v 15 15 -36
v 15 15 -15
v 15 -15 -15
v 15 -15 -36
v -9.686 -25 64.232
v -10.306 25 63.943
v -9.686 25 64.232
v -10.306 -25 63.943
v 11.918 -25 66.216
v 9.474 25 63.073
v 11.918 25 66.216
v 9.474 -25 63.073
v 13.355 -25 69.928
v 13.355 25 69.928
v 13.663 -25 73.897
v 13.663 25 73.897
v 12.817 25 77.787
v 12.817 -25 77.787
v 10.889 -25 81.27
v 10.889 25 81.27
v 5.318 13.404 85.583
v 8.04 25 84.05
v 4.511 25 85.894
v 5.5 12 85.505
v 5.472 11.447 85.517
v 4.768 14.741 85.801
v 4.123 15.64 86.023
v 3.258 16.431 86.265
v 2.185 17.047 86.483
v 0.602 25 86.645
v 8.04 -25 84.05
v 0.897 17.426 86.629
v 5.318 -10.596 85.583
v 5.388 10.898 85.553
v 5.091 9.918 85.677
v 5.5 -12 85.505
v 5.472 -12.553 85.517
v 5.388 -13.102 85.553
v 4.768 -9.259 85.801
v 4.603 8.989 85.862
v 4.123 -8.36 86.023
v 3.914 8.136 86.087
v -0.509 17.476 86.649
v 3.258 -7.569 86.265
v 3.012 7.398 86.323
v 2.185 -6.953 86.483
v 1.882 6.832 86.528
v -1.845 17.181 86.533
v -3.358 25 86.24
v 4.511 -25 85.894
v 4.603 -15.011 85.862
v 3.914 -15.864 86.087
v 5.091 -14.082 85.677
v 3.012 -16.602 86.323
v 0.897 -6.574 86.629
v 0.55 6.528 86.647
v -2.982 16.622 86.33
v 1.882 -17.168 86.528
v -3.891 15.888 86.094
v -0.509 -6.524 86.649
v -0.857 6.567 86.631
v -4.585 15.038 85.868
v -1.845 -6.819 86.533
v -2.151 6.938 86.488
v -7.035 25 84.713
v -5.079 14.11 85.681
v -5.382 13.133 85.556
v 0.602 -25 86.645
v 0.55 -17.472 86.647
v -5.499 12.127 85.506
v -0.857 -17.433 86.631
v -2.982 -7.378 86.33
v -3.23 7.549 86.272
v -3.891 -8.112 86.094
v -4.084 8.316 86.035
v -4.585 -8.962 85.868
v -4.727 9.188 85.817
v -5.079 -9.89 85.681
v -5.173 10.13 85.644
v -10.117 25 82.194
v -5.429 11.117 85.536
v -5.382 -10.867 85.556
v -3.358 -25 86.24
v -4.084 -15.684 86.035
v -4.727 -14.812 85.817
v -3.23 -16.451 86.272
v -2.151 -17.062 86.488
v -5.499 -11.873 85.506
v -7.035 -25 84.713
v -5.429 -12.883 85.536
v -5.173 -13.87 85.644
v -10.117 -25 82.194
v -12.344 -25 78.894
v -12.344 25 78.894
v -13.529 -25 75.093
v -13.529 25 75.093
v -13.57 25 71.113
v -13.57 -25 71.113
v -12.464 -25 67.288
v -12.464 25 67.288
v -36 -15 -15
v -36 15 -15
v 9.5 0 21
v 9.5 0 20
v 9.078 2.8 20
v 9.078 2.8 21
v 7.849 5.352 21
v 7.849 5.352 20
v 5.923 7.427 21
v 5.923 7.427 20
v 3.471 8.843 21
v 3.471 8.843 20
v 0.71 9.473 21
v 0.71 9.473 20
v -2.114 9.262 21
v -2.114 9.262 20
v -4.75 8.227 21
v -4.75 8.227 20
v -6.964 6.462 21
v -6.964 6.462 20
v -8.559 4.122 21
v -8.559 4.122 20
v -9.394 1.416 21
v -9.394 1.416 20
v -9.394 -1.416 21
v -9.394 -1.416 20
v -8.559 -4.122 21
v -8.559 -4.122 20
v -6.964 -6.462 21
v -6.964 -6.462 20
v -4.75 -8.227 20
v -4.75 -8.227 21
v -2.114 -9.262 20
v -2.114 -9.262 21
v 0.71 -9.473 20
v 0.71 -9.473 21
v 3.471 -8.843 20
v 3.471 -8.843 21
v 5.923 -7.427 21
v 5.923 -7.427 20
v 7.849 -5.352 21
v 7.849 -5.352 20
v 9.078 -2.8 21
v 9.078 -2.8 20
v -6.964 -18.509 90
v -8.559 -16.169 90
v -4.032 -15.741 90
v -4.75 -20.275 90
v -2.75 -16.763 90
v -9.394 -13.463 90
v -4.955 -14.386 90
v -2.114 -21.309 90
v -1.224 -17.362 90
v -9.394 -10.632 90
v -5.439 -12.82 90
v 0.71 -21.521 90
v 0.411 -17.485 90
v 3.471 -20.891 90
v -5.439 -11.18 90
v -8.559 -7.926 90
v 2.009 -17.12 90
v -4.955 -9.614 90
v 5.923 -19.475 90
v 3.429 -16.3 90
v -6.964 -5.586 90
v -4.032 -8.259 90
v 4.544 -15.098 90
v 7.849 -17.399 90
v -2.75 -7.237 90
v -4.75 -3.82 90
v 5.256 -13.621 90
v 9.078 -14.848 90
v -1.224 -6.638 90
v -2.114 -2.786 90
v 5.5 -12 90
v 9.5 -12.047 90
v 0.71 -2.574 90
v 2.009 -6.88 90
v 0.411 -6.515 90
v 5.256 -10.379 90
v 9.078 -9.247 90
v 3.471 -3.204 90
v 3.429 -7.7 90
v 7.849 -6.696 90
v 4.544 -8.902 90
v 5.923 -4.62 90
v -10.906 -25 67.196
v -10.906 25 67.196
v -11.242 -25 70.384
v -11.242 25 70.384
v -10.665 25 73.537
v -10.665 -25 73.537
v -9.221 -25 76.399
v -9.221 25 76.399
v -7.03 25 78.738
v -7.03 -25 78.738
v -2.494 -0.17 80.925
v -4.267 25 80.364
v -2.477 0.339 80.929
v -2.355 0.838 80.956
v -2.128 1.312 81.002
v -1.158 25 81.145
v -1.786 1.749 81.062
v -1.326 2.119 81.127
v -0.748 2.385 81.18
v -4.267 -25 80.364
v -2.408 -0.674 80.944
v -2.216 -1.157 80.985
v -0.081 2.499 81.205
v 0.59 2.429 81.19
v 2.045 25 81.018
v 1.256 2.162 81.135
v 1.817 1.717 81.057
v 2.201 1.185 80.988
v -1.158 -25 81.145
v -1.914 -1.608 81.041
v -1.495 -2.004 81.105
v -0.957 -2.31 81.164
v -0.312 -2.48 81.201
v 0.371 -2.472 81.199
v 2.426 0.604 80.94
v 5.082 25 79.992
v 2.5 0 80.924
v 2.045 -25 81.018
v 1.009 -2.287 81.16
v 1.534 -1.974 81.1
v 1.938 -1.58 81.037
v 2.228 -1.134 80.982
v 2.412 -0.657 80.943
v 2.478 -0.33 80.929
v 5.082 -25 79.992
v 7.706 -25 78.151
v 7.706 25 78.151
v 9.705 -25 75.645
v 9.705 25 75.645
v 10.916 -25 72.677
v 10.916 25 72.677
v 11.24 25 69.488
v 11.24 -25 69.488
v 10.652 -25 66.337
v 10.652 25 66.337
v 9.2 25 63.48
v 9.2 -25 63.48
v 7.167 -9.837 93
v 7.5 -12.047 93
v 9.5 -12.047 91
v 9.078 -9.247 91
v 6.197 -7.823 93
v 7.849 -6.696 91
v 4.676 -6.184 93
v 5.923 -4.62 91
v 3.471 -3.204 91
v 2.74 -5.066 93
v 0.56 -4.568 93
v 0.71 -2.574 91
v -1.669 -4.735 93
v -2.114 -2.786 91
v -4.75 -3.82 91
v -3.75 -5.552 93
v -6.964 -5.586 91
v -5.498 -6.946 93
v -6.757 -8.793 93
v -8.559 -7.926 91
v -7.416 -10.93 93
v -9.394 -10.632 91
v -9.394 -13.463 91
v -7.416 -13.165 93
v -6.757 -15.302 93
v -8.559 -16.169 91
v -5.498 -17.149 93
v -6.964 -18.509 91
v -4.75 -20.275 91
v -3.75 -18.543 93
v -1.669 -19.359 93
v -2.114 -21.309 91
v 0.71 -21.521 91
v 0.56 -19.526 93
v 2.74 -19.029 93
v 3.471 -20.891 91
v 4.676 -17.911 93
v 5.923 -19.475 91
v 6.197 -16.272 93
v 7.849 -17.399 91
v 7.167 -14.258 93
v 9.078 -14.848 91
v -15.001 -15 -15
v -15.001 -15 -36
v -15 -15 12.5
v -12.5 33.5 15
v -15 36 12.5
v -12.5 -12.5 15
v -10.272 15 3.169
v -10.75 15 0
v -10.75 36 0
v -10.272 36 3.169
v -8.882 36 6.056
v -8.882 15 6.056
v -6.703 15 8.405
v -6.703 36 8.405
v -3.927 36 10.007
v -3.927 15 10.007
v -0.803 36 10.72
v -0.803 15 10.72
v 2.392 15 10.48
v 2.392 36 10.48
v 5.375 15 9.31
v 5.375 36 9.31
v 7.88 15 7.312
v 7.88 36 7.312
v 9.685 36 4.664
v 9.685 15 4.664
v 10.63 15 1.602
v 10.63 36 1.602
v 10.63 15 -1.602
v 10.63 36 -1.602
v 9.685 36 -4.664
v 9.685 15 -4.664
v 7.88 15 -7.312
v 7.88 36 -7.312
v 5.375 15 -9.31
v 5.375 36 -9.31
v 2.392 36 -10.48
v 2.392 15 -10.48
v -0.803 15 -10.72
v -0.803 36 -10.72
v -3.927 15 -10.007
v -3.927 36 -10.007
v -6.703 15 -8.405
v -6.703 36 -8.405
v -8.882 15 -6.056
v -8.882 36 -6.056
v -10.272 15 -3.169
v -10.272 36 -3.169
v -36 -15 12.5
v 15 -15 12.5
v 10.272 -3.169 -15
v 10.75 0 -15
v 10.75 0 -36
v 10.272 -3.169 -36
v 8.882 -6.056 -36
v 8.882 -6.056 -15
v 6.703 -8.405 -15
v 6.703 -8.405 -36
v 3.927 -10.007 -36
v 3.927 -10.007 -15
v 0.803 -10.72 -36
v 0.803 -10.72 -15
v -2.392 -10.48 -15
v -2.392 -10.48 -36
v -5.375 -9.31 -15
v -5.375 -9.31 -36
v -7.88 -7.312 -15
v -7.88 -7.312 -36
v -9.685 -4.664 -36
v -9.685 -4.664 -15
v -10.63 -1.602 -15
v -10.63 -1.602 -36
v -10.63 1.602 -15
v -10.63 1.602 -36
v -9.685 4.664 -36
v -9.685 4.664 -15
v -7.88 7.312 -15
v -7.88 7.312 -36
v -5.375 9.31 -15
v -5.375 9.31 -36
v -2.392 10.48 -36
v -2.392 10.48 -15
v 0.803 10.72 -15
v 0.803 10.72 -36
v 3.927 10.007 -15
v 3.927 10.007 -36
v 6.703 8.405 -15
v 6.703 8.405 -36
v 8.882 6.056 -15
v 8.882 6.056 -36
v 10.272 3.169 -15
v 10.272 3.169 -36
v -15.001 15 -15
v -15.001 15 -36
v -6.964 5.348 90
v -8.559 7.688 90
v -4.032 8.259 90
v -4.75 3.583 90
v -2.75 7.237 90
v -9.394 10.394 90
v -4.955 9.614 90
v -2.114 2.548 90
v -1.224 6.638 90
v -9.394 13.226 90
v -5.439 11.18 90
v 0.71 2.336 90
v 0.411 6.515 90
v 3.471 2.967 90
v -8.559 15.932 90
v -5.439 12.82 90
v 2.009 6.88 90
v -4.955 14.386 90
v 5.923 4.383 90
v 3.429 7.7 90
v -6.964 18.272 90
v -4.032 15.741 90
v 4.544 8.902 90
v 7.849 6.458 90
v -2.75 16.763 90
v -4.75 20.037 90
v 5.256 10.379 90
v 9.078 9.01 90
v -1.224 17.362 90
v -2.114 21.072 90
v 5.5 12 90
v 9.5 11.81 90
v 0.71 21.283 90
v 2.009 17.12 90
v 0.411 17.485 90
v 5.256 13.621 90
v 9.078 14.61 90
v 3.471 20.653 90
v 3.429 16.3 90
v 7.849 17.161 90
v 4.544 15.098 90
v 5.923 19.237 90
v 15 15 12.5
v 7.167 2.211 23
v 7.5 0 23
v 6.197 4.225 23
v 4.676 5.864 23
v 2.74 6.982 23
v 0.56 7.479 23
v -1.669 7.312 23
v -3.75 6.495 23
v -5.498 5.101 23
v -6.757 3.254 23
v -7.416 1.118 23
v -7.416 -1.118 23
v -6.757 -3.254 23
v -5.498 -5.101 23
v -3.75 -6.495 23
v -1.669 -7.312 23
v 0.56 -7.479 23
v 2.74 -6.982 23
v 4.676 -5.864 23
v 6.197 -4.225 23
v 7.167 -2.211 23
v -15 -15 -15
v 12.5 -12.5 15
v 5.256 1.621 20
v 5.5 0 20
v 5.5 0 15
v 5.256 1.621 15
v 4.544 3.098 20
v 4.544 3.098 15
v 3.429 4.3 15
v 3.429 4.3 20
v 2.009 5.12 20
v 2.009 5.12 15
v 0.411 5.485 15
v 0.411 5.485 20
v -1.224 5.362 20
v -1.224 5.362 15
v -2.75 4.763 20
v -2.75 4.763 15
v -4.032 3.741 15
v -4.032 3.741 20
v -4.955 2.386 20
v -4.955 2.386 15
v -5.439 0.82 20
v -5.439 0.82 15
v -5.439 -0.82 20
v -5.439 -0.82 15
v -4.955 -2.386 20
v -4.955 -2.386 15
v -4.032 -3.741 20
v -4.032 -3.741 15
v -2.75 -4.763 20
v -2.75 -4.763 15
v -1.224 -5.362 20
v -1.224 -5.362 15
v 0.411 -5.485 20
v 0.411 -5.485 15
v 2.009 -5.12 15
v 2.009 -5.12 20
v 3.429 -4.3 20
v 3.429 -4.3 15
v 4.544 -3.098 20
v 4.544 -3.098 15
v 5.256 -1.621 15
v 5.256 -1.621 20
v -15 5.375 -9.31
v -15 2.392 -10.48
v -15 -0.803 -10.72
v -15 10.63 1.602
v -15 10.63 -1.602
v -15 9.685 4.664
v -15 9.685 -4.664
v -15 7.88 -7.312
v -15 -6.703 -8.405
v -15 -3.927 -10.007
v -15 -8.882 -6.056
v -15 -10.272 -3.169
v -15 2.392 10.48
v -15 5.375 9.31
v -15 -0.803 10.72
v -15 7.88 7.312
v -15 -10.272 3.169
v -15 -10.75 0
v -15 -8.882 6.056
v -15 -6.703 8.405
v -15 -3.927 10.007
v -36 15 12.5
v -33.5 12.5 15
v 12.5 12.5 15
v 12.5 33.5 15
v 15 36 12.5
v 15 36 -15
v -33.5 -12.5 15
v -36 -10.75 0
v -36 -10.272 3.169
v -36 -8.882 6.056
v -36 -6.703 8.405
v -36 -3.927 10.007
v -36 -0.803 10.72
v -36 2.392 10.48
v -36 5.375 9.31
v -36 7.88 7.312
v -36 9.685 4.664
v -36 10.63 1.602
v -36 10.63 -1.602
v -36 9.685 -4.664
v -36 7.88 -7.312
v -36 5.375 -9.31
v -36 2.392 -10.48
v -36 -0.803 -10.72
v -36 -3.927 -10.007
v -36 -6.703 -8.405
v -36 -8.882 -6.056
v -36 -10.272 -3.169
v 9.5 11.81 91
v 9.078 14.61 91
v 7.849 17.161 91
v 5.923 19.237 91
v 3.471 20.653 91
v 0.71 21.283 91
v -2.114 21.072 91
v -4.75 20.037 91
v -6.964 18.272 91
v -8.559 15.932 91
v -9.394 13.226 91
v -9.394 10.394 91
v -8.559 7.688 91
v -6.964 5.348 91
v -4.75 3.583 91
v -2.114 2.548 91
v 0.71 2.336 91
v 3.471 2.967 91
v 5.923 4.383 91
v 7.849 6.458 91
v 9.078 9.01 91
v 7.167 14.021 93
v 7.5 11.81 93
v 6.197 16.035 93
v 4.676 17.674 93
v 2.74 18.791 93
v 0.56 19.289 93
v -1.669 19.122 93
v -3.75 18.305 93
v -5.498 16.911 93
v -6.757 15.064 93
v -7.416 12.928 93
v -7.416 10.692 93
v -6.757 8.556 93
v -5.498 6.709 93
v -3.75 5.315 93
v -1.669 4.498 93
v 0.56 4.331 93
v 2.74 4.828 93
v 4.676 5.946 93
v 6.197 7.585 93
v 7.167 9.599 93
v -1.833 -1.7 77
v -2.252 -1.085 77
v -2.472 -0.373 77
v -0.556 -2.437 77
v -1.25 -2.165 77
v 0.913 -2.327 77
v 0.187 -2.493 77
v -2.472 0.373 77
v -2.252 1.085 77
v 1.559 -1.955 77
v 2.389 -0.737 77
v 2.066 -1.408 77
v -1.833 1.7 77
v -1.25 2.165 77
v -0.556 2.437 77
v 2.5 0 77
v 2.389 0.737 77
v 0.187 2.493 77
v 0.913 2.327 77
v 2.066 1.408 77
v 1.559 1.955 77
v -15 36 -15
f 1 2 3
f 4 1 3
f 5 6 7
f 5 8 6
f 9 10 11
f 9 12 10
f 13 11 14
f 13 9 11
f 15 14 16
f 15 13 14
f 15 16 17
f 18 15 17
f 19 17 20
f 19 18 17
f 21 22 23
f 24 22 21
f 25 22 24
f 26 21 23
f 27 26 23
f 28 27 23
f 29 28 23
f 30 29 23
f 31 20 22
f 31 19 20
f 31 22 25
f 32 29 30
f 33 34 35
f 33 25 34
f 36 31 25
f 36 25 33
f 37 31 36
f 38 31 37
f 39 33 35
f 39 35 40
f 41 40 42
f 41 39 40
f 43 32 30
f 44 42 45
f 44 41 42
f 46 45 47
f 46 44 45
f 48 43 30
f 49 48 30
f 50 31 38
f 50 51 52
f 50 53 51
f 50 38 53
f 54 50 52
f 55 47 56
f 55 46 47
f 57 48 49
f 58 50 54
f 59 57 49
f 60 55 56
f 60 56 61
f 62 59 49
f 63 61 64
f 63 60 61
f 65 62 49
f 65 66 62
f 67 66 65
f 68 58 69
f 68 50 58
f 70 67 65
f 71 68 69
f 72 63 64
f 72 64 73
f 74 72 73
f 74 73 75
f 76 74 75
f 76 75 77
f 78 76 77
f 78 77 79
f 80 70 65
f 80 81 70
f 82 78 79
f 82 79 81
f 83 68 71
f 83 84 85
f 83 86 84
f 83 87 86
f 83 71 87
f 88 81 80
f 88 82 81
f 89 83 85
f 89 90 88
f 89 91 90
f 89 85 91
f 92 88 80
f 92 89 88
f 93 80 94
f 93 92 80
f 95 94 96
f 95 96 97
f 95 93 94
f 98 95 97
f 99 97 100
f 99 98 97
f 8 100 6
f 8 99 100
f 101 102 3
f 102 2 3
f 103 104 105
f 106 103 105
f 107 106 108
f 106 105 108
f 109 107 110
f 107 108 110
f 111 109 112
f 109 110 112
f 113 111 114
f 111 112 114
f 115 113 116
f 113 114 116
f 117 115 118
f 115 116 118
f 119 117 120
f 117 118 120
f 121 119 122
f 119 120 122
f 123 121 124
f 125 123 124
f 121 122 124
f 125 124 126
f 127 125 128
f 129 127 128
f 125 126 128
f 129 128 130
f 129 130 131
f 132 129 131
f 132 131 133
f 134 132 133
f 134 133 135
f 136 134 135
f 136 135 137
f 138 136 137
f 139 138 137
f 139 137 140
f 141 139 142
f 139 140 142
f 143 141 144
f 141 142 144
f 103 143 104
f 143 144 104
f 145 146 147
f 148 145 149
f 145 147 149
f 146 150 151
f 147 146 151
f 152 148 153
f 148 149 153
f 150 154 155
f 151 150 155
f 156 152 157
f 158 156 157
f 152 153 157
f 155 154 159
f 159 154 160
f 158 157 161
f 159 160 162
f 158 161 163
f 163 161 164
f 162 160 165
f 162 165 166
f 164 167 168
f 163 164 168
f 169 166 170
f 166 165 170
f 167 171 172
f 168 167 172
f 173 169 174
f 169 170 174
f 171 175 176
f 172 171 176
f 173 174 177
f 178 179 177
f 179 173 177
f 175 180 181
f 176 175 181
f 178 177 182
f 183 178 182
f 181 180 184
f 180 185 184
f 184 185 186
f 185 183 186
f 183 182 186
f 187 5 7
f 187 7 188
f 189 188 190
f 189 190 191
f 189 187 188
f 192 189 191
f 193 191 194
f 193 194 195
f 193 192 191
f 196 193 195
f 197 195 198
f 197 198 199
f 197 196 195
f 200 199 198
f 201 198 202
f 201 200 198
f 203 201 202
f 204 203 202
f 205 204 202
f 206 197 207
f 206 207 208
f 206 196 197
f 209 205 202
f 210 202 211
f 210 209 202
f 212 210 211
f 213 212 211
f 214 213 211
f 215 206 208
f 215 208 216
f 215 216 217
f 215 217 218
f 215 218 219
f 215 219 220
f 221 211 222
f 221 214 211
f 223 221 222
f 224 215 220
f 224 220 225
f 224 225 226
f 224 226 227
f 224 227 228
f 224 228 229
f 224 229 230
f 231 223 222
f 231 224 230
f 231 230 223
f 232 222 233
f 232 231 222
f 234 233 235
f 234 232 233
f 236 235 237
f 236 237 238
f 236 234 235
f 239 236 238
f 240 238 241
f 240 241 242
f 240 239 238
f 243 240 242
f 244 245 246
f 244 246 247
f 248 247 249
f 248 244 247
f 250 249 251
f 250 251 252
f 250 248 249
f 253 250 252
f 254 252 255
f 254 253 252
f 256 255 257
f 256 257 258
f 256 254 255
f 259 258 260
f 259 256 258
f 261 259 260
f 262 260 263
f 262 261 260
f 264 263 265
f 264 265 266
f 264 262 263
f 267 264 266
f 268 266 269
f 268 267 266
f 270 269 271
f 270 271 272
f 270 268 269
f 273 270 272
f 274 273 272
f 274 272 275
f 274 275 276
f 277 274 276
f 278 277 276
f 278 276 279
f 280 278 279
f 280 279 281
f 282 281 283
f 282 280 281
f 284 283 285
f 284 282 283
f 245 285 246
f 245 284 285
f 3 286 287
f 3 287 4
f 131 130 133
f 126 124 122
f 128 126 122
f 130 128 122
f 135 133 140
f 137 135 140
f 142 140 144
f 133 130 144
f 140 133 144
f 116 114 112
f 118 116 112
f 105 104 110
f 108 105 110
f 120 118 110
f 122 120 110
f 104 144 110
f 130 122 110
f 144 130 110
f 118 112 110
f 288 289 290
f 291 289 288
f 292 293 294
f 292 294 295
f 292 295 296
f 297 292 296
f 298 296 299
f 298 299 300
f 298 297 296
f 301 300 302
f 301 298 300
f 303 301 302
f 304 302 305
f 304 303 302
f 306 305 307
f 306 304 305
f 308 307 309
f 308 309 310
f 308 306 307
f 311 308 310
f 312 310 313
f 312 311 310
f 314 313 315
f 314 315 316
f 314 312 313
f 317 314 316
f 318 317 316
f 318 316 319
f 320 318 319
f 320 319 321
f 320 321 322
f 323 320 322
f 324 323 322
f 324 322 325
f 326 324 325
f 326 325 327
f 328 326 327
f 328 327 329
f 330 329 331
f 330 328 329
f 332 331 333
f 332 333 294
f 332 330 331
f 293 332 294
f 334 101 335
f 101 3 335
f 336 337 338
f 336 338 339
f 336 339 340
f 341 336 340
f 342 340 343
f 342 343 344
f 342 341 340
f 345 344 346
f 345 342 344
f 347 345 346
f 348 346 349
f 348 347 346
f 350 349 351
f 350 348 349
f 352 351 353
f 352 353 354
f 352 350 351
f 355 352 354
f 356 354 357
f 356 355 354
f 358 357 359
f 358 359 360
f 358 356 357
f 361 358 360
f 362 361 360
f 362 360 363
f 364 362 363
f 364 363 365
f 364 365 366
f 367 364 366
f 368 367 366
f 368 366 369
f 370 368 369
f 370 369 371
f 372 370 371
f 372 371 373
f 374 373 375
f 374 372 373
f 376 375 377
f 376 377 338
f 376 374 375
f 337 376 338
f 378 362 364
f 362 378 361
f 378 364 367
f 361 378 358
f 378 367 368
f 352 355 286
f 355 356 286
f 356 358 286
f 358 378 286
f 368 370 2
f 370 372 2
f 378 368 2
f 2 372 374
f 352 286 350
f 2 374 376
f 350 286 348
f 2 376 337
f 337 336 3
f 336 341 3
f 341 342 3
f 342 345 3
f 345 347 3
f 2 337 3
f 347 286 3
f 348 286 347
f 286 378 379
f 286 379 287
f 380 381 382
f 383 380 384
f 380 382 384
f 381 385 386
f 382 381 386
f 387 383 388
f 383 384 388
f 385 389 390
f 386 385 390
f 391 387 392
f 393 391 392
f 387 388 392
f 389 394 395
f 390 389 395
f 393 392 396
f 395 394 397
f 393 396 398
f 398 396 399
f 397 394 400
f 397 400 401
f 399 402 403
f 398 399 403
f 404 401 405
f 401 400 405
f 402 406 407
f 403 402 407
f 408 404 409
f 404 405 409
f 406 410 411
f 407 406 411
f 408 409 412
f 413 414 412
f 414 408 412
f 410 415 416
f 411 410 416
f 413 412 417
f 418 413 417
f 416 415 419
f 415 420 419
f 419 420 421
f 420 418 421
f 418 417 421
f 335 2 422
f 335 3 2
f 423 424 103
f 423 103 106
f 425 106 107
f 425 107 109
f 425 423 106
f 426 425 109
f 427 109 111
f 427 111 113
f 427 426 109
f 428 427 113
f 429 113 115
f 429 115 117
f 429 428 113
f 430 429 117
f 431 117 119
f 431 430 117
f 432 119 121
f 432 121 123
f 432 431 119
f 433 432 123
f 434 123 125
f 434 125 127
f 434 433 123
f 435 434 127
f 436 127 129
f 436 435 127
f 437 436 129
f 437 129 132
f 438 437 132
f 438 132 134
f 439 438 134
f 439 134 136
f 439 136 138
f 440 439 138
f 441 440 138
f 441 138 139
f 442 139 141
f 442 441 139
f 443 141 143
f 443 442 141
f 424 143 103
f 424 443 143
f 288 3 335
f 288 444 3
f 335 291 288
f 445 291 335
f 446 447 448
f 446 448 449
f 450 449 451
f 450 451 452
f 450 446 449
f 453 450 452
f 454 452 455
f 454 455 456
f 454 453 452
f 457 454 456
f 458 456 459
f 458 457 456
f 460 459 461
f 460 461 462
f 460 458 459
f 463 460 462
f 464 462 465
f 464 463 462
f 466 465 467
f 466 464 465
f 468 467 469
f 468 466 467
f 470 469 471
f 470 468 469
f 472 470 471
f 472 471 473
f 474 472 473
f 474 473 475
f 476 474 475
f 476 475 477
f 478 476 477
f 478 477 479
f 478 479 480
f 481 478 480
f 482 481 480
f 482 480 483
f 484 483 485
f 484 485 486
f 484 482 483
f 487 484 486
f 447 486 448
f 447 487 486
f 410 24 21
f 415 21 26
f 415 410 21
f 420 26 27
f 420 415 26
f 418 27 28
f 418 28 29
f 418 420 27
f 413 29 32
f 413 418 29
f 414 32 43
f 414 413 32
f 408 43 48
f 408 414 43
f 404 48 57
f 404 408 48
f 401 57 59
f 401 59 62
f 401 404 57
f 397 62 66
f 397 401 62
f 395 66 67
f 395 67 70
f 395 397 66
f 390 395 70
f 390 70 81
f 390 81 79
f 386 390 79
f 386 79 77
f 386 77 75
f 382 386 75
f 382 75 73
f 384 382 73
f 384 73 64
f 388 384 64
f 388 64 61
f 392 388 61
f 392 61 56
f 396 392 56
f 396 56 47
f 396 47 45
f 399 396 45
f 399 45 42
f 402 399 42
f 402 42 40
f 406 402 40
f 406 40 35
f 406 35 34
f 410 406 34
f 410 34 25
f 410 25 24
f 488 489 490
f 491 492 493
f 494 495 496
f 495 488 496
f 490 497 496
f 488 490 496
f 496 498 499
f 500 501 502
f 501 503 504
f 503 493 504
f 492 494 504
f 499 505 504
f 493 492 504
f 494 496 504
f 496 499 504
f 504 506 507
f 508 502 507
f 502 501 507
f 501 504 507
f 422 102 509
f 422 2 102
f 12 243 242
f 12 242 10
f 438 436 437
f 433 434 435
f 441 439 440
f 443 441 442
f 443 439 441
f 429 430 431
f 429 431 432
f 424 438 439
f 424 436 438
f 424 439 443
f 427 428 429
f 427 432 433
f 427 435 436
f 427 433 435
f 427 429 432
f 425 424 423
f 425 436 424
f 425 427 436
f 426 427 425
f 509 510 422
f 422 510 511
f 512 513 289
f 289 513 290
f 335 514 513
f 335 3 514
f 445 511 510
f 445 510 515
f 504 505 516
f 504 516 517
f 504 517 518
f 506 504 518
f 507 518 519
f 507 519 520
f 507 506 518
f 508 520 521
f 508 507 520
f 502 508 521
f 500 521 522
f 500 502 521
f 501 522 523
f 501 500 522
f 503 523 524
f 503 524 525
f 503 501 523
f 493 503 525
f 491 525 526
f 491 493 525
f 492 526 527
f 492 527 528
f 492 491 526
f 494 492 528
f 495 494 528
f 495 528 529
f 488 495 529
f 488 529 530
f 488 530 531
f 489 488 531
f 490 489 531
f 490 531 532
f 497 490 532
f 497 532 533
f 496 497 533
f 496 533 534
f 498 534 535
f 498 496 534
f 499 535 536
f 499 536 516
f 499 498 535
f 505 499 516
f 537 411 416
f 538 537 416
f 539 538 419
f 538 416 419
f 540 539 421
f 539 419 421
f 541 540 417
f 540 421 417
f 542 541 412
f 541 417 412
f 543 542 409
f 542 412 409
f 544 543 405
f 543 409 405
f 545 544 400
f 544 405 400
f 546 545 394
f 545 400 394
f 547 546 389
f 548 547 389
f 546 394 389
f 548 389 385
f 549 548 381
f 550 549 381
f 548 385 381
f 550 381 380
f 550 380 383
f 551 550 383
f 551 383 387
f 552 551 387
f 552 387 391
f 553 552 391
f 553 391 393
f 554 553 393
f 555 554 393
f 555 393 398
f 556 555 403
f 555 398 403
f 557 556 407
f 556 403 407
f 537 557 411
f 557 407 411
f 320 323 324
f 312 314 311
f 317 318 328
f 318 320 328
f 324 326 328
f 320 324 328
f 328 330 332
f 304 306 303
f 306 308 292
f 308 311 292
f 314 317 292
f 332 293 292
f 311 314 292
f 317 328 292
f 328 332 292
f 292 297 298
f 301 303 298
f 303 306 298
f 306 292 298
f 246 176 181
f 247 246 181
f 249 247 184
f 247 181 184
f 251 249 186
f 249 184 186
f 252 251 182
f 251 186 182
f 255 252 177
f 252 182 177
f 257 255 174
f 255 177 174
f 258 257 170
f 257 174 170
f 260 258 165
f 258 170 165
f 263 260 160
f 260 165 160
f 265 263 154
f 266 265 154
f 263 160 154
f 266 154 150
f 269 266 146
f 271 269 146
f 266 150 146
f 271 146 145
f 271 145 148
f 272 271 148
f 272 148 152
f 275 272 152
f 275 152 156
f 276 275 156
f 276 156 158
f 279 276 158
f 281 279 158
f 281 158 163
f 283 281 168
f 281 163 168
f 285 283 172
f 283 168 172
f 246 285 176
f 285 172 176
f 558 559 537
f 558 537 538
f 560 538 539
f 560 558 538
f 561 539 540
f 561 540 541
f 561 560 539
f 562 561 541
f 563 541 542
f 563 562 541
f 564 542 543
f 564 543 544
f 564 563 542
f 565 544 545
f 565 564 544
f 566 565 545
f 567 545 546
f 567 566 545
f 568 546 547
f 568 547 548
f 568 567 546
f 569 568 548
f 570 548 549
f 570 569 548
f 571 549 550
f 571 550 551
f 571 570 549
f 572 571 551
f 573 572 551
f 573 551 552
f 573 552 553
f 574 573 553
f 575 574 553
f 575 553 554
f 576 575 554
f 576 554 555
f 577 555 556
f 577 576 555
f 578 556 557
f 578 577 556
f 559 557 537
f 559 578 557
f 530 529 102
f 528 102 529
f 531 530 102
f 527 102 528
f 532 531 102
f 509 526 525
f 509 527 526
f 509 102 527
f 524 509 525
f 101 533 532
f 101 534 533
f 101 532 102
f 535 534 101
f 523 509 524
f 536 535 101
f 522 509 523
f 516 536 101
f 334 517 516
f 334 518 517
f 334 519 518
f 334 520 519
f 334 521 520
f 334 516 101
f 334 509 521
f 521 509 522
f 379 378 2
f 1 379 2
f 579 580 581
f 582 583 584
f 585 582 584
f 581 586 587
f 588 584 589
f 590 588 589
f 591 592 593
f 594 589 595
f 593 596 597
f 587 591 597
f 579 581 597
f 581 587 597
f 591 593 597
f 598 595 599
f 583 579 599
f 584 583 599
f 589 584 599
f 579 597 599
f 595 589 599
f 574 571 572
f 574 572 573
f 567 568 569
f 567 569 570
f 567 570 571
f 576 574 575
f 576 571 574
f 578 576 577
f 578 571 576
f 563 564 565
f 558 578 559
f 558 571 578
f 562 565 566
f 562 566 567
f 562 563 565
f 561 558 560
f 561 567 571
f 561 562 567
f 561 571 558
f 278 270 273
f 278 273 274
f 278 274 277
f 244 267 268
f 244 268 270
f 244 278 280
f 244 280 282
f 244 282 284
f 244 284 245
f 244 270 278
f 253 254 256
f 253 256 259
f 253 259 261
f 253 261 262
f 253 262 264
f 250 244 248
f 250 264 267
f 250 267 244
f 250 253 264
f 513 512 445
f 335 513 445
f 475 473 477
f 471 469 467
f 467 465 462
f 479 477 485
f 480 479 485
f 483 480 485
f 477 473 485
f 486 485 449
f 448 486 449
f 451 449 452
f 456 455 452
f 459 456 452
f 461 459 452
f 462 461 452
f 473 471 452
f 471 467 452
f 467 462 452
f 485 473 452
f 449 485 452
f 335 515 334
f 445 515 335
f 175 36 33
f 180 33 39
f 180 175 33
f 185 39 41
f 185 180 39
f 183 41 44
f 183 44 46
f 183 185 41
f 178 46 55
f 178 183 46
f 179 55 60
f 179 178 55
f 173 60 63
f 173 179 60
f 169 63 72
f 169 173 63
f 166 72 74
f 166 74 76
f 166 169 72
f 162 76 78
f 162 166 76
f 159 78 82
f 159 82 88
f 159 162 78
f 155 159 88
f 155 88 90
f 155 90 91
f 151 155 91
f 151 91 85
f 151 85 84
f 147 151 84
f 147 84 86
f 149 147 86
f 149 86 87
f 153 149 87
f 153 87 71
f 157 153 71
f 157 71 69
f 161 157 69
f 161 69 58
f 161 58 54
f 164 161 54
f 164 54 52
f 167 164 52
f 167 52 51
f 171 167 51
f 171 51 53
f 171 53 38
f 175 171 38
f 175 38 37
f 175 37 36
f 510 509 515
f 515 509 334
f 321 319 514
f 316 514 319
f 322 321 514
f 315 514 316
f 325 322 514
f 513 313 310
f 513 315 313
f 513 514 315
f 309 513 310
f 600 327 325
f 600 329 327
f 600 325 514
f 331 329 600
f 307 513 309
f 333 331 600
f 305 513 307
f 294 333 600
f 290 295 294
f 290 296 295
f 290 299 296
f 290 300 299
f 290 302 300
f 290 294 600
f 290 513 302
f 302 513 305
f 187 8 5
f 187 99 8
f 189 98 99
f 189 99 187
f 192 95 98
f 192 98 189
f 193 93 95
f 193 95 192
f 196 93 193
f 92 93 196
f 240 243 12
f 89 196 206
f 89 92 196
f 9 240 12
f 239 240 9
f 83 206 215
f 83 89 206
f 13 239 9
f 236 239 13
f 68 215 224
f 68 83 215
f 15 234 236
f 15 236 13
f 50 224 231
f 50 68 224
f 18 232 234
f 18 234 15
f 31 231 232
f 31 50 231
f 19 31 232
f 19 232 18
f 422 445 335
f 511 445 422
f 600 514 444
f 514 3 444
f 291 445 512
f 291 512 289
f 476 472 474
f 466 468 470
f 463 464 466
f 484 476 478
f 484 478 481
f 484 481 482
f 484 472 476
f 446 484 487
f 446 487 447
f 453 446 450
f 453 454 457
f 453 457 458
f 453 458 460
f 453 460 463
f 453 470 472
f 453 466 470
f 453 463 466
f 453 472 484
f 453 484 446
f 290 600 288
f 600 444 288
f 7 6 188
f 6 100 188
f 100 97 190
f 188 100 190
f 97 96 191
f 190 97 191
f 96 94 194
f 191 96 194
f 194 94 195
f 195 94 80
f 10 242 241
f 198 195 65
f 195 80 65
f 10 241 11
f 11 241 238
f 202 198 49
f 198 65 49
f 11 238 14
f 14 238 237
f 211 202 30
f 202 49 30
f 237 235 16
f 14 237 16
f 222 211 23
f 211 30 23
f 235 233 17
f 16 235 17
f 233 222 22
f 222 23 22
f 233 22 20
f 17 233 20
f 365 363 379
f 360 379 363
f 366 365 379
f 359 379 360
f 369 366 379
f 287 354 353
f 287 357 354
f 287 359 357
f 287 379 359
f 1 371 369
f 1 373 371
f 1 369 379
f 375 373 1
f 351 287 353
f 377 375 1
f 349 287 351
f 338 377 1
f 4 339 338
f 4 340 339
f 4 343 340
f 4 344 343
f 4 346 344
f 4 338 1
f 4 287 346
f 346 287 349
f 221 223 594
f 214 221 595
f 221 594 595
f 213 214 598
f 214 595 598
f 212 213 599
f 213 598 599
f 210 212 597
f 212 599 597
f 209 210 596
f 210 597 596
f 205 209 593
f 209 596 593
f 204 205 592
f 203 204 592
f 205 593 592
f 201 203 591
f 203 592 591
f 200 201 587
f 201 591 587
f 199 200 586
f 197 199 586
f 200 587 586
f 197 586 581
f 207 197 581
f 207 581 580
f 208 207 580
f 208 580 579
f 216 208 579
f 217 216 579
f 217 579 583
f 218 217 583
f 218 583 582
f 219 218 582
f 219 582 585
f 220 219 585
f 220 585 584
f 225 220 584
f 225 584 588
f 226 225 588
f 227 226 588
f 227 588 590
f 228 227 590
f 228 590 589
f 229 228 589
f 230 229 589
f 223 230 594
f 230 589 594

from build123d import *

# Parameters (mm, degrees)
F0_W       = 30
F0_H       = 30
F1_DEPTH   = 15
F3_W       = 30
F3_H       = 30
F3_R       = 10.75
F4_DEPTH   = 21
F5_COUNT   = 2
F5_ANGLE   = 90
F6_W       = 30.0012215599
F6_H       = 30
F6_R       = 10.75
F7_DEPTH   = 21
F9_R       = 5.5
F10_DEPTH  = 5
F11_R      = 9.5
F11_R_2    = 5.5
F12_DEPTH  = 3
F13_SIZE   = 2
F14_SIZE   = 2.5
F14_2_SIZE = 2.5
F16_DEPTH  = 25
F18_R      = 2.5
F19_DEPTH  = 7
F21_R      = 5.5
F22_DEPTH  = 5
F23_R      = 9.5
F24_DEPTH  = 3
F25_SIZE   = 2


with BuildPart() as f1:
    # F0 (on Front) → F1 (new body, symmetric)
    with BuildSketch(Plane.XZ):
        Rectangle(F0_W, F0_H)
    extrude(amount=F1_DEPTH, both=True)

    # F3 (on face) → F4 (join)
    with BuildSketch(Plane(origin=(-15, 0, 0), x_dir=(0, -1, 0), z_dir=(-1, 0, 0))):
        Rectangle(F3_W, F3_H)
        Circle(F3_R, mode=Mode.SUBTRACT)
    extrude(amount=F4_DEPTH)


with BuildPart() as f5_1:
    # F5: instance of F1
    add(f1.part.rotate(Axis((0, 0, -5.7476405054), (0, 0, -1)), 1 * F5_ANGLE / (F5_COUNT - 1)))

    # F14
    f14_edges = [f5_1.edges().sort_by_distance(p)[0] for p in [
        (15, 10.5, 15),
        (0, 36, 15),
        (-15, 10.5, 15),
        (0, -15, 15),
    ]]
    chamfer(f14_edges, length=F14_SIZE)


with BuildPart() as f7:
    # F6 (on face) → F7 (new body)
    with BuildSketch(Plane(origin=(0, 0, -15), x_dir=(1, 0, 0), z_dir=(0, 0, -1))):
        with Locations((-0.00061078, 0)):
            Rectangle(F6_W, F6_H)
        Circle(F6_R, mode=Mode.SUBTRACT)
    extrude(amount=F7_DEPTH)


with BuildPart() as f10:
    # F9 (on offset) → F10 (new body)
    with BuildSketch(Plane.XY.offset(20)):
        Circle(F9_R)
    extrude(amount=-F10_DEPTH)


with BuildPart() as f12:
    # F11 (on face) → F12 (new body)
    with BuildSketch(Plane.XY.offset(20)):
        Circle(F11_R)
        Circle(F11_R_2, mode=Mode.SUBTRACT)
        Circle(F11_R_2)
    extrude(amount=F12_DEPTH)

    # F13
    f13_edges = [f12.edges().sort_by_distance(p)[0] for p in [
        (-9.5, 0, 23),
    ]]
    chamfer(f13_edges, length=F13_SIZE)


with BuildPart() as f1_1:
    add(f1.part)

    # F14#2
    f14_2_edges = [f1_1.edges().sort_by_distance(p)[0] for p in [
        (-10.5, -15, 15),
        (-10.5, 15, 15),
        (-36, 0, 15),
        (15, 0, 15),
    ]]
    chamfer(f14_2_edges, length=F14_2_SIZE)


with BuildPart() as f16:
    # F15 (on Front) → F16 (new body, symmetric)
    with BuildSketch(Plane.XZ):
        with BuildLine():
            Line((-10.3058908372, 63.9432949316), (-9.6855354671, 64.232037034))
            ThreePointArc((-9.6855354671, 64.232037034), (0.447806105, 81.1961362197), (9.1995952199, 63.4797184134))
            Line((9.1995952199, 63.4797184134), (9.4740811403, 63.0731721958))
            ThreePointArc((9.4740811403, 63.0731721958), (0.6018764298, 86.6448375573), (-10.3058908372, 63.9432949316))
        make_face()
    extrude(amount=F16_DEPTH, both=True)

    # F18 (on offset) → F19 (join)
    with BuildSketch(Plane.XY.offset(77)):
        Circle(F18_R)
    extrude(amount=F19_DEPTH)

    # F21 (on offset) → F22 (join)
    with BuildSketch(Plane.XY.offset(90)):
        with Locations((0, 12)):
            Circle(F21_R)
        with Locations((0, -12)):
            Circle(F21_R)
    extrude(amount=-F22_DEPTH)

    # F23 (on offset) + F21 (on offset) → F24 (join)
    with BuildSketch(Plane.XY.offset(90)):
        with Locations((0, 11.8099274114)):
            Circle(F23_R)
        with Locations((0, -12.047437951)):
            Circle(F23_R)
    with BuildSketch(Plane.XY.offset(90)):
        with Locations((0, 12)):
            Circle(F21_R)
        with Locations((0, -12)):
            Circle(F21_R)
    extrude(amount=F24_DEPTH)

    # F25
    f25_edges = [f16.edges().sort_by_distance(p)[0] for p in [
        (-9.5, 11.809927, 93),
        (-9.5, -12.047438, 93),
    ]]
    chamfer(f25_edges, length=F25_SIZE)


solid = Compound([f5_1.part, f7.part, f10.part, f12.part, f1_1.part, f16.part])
